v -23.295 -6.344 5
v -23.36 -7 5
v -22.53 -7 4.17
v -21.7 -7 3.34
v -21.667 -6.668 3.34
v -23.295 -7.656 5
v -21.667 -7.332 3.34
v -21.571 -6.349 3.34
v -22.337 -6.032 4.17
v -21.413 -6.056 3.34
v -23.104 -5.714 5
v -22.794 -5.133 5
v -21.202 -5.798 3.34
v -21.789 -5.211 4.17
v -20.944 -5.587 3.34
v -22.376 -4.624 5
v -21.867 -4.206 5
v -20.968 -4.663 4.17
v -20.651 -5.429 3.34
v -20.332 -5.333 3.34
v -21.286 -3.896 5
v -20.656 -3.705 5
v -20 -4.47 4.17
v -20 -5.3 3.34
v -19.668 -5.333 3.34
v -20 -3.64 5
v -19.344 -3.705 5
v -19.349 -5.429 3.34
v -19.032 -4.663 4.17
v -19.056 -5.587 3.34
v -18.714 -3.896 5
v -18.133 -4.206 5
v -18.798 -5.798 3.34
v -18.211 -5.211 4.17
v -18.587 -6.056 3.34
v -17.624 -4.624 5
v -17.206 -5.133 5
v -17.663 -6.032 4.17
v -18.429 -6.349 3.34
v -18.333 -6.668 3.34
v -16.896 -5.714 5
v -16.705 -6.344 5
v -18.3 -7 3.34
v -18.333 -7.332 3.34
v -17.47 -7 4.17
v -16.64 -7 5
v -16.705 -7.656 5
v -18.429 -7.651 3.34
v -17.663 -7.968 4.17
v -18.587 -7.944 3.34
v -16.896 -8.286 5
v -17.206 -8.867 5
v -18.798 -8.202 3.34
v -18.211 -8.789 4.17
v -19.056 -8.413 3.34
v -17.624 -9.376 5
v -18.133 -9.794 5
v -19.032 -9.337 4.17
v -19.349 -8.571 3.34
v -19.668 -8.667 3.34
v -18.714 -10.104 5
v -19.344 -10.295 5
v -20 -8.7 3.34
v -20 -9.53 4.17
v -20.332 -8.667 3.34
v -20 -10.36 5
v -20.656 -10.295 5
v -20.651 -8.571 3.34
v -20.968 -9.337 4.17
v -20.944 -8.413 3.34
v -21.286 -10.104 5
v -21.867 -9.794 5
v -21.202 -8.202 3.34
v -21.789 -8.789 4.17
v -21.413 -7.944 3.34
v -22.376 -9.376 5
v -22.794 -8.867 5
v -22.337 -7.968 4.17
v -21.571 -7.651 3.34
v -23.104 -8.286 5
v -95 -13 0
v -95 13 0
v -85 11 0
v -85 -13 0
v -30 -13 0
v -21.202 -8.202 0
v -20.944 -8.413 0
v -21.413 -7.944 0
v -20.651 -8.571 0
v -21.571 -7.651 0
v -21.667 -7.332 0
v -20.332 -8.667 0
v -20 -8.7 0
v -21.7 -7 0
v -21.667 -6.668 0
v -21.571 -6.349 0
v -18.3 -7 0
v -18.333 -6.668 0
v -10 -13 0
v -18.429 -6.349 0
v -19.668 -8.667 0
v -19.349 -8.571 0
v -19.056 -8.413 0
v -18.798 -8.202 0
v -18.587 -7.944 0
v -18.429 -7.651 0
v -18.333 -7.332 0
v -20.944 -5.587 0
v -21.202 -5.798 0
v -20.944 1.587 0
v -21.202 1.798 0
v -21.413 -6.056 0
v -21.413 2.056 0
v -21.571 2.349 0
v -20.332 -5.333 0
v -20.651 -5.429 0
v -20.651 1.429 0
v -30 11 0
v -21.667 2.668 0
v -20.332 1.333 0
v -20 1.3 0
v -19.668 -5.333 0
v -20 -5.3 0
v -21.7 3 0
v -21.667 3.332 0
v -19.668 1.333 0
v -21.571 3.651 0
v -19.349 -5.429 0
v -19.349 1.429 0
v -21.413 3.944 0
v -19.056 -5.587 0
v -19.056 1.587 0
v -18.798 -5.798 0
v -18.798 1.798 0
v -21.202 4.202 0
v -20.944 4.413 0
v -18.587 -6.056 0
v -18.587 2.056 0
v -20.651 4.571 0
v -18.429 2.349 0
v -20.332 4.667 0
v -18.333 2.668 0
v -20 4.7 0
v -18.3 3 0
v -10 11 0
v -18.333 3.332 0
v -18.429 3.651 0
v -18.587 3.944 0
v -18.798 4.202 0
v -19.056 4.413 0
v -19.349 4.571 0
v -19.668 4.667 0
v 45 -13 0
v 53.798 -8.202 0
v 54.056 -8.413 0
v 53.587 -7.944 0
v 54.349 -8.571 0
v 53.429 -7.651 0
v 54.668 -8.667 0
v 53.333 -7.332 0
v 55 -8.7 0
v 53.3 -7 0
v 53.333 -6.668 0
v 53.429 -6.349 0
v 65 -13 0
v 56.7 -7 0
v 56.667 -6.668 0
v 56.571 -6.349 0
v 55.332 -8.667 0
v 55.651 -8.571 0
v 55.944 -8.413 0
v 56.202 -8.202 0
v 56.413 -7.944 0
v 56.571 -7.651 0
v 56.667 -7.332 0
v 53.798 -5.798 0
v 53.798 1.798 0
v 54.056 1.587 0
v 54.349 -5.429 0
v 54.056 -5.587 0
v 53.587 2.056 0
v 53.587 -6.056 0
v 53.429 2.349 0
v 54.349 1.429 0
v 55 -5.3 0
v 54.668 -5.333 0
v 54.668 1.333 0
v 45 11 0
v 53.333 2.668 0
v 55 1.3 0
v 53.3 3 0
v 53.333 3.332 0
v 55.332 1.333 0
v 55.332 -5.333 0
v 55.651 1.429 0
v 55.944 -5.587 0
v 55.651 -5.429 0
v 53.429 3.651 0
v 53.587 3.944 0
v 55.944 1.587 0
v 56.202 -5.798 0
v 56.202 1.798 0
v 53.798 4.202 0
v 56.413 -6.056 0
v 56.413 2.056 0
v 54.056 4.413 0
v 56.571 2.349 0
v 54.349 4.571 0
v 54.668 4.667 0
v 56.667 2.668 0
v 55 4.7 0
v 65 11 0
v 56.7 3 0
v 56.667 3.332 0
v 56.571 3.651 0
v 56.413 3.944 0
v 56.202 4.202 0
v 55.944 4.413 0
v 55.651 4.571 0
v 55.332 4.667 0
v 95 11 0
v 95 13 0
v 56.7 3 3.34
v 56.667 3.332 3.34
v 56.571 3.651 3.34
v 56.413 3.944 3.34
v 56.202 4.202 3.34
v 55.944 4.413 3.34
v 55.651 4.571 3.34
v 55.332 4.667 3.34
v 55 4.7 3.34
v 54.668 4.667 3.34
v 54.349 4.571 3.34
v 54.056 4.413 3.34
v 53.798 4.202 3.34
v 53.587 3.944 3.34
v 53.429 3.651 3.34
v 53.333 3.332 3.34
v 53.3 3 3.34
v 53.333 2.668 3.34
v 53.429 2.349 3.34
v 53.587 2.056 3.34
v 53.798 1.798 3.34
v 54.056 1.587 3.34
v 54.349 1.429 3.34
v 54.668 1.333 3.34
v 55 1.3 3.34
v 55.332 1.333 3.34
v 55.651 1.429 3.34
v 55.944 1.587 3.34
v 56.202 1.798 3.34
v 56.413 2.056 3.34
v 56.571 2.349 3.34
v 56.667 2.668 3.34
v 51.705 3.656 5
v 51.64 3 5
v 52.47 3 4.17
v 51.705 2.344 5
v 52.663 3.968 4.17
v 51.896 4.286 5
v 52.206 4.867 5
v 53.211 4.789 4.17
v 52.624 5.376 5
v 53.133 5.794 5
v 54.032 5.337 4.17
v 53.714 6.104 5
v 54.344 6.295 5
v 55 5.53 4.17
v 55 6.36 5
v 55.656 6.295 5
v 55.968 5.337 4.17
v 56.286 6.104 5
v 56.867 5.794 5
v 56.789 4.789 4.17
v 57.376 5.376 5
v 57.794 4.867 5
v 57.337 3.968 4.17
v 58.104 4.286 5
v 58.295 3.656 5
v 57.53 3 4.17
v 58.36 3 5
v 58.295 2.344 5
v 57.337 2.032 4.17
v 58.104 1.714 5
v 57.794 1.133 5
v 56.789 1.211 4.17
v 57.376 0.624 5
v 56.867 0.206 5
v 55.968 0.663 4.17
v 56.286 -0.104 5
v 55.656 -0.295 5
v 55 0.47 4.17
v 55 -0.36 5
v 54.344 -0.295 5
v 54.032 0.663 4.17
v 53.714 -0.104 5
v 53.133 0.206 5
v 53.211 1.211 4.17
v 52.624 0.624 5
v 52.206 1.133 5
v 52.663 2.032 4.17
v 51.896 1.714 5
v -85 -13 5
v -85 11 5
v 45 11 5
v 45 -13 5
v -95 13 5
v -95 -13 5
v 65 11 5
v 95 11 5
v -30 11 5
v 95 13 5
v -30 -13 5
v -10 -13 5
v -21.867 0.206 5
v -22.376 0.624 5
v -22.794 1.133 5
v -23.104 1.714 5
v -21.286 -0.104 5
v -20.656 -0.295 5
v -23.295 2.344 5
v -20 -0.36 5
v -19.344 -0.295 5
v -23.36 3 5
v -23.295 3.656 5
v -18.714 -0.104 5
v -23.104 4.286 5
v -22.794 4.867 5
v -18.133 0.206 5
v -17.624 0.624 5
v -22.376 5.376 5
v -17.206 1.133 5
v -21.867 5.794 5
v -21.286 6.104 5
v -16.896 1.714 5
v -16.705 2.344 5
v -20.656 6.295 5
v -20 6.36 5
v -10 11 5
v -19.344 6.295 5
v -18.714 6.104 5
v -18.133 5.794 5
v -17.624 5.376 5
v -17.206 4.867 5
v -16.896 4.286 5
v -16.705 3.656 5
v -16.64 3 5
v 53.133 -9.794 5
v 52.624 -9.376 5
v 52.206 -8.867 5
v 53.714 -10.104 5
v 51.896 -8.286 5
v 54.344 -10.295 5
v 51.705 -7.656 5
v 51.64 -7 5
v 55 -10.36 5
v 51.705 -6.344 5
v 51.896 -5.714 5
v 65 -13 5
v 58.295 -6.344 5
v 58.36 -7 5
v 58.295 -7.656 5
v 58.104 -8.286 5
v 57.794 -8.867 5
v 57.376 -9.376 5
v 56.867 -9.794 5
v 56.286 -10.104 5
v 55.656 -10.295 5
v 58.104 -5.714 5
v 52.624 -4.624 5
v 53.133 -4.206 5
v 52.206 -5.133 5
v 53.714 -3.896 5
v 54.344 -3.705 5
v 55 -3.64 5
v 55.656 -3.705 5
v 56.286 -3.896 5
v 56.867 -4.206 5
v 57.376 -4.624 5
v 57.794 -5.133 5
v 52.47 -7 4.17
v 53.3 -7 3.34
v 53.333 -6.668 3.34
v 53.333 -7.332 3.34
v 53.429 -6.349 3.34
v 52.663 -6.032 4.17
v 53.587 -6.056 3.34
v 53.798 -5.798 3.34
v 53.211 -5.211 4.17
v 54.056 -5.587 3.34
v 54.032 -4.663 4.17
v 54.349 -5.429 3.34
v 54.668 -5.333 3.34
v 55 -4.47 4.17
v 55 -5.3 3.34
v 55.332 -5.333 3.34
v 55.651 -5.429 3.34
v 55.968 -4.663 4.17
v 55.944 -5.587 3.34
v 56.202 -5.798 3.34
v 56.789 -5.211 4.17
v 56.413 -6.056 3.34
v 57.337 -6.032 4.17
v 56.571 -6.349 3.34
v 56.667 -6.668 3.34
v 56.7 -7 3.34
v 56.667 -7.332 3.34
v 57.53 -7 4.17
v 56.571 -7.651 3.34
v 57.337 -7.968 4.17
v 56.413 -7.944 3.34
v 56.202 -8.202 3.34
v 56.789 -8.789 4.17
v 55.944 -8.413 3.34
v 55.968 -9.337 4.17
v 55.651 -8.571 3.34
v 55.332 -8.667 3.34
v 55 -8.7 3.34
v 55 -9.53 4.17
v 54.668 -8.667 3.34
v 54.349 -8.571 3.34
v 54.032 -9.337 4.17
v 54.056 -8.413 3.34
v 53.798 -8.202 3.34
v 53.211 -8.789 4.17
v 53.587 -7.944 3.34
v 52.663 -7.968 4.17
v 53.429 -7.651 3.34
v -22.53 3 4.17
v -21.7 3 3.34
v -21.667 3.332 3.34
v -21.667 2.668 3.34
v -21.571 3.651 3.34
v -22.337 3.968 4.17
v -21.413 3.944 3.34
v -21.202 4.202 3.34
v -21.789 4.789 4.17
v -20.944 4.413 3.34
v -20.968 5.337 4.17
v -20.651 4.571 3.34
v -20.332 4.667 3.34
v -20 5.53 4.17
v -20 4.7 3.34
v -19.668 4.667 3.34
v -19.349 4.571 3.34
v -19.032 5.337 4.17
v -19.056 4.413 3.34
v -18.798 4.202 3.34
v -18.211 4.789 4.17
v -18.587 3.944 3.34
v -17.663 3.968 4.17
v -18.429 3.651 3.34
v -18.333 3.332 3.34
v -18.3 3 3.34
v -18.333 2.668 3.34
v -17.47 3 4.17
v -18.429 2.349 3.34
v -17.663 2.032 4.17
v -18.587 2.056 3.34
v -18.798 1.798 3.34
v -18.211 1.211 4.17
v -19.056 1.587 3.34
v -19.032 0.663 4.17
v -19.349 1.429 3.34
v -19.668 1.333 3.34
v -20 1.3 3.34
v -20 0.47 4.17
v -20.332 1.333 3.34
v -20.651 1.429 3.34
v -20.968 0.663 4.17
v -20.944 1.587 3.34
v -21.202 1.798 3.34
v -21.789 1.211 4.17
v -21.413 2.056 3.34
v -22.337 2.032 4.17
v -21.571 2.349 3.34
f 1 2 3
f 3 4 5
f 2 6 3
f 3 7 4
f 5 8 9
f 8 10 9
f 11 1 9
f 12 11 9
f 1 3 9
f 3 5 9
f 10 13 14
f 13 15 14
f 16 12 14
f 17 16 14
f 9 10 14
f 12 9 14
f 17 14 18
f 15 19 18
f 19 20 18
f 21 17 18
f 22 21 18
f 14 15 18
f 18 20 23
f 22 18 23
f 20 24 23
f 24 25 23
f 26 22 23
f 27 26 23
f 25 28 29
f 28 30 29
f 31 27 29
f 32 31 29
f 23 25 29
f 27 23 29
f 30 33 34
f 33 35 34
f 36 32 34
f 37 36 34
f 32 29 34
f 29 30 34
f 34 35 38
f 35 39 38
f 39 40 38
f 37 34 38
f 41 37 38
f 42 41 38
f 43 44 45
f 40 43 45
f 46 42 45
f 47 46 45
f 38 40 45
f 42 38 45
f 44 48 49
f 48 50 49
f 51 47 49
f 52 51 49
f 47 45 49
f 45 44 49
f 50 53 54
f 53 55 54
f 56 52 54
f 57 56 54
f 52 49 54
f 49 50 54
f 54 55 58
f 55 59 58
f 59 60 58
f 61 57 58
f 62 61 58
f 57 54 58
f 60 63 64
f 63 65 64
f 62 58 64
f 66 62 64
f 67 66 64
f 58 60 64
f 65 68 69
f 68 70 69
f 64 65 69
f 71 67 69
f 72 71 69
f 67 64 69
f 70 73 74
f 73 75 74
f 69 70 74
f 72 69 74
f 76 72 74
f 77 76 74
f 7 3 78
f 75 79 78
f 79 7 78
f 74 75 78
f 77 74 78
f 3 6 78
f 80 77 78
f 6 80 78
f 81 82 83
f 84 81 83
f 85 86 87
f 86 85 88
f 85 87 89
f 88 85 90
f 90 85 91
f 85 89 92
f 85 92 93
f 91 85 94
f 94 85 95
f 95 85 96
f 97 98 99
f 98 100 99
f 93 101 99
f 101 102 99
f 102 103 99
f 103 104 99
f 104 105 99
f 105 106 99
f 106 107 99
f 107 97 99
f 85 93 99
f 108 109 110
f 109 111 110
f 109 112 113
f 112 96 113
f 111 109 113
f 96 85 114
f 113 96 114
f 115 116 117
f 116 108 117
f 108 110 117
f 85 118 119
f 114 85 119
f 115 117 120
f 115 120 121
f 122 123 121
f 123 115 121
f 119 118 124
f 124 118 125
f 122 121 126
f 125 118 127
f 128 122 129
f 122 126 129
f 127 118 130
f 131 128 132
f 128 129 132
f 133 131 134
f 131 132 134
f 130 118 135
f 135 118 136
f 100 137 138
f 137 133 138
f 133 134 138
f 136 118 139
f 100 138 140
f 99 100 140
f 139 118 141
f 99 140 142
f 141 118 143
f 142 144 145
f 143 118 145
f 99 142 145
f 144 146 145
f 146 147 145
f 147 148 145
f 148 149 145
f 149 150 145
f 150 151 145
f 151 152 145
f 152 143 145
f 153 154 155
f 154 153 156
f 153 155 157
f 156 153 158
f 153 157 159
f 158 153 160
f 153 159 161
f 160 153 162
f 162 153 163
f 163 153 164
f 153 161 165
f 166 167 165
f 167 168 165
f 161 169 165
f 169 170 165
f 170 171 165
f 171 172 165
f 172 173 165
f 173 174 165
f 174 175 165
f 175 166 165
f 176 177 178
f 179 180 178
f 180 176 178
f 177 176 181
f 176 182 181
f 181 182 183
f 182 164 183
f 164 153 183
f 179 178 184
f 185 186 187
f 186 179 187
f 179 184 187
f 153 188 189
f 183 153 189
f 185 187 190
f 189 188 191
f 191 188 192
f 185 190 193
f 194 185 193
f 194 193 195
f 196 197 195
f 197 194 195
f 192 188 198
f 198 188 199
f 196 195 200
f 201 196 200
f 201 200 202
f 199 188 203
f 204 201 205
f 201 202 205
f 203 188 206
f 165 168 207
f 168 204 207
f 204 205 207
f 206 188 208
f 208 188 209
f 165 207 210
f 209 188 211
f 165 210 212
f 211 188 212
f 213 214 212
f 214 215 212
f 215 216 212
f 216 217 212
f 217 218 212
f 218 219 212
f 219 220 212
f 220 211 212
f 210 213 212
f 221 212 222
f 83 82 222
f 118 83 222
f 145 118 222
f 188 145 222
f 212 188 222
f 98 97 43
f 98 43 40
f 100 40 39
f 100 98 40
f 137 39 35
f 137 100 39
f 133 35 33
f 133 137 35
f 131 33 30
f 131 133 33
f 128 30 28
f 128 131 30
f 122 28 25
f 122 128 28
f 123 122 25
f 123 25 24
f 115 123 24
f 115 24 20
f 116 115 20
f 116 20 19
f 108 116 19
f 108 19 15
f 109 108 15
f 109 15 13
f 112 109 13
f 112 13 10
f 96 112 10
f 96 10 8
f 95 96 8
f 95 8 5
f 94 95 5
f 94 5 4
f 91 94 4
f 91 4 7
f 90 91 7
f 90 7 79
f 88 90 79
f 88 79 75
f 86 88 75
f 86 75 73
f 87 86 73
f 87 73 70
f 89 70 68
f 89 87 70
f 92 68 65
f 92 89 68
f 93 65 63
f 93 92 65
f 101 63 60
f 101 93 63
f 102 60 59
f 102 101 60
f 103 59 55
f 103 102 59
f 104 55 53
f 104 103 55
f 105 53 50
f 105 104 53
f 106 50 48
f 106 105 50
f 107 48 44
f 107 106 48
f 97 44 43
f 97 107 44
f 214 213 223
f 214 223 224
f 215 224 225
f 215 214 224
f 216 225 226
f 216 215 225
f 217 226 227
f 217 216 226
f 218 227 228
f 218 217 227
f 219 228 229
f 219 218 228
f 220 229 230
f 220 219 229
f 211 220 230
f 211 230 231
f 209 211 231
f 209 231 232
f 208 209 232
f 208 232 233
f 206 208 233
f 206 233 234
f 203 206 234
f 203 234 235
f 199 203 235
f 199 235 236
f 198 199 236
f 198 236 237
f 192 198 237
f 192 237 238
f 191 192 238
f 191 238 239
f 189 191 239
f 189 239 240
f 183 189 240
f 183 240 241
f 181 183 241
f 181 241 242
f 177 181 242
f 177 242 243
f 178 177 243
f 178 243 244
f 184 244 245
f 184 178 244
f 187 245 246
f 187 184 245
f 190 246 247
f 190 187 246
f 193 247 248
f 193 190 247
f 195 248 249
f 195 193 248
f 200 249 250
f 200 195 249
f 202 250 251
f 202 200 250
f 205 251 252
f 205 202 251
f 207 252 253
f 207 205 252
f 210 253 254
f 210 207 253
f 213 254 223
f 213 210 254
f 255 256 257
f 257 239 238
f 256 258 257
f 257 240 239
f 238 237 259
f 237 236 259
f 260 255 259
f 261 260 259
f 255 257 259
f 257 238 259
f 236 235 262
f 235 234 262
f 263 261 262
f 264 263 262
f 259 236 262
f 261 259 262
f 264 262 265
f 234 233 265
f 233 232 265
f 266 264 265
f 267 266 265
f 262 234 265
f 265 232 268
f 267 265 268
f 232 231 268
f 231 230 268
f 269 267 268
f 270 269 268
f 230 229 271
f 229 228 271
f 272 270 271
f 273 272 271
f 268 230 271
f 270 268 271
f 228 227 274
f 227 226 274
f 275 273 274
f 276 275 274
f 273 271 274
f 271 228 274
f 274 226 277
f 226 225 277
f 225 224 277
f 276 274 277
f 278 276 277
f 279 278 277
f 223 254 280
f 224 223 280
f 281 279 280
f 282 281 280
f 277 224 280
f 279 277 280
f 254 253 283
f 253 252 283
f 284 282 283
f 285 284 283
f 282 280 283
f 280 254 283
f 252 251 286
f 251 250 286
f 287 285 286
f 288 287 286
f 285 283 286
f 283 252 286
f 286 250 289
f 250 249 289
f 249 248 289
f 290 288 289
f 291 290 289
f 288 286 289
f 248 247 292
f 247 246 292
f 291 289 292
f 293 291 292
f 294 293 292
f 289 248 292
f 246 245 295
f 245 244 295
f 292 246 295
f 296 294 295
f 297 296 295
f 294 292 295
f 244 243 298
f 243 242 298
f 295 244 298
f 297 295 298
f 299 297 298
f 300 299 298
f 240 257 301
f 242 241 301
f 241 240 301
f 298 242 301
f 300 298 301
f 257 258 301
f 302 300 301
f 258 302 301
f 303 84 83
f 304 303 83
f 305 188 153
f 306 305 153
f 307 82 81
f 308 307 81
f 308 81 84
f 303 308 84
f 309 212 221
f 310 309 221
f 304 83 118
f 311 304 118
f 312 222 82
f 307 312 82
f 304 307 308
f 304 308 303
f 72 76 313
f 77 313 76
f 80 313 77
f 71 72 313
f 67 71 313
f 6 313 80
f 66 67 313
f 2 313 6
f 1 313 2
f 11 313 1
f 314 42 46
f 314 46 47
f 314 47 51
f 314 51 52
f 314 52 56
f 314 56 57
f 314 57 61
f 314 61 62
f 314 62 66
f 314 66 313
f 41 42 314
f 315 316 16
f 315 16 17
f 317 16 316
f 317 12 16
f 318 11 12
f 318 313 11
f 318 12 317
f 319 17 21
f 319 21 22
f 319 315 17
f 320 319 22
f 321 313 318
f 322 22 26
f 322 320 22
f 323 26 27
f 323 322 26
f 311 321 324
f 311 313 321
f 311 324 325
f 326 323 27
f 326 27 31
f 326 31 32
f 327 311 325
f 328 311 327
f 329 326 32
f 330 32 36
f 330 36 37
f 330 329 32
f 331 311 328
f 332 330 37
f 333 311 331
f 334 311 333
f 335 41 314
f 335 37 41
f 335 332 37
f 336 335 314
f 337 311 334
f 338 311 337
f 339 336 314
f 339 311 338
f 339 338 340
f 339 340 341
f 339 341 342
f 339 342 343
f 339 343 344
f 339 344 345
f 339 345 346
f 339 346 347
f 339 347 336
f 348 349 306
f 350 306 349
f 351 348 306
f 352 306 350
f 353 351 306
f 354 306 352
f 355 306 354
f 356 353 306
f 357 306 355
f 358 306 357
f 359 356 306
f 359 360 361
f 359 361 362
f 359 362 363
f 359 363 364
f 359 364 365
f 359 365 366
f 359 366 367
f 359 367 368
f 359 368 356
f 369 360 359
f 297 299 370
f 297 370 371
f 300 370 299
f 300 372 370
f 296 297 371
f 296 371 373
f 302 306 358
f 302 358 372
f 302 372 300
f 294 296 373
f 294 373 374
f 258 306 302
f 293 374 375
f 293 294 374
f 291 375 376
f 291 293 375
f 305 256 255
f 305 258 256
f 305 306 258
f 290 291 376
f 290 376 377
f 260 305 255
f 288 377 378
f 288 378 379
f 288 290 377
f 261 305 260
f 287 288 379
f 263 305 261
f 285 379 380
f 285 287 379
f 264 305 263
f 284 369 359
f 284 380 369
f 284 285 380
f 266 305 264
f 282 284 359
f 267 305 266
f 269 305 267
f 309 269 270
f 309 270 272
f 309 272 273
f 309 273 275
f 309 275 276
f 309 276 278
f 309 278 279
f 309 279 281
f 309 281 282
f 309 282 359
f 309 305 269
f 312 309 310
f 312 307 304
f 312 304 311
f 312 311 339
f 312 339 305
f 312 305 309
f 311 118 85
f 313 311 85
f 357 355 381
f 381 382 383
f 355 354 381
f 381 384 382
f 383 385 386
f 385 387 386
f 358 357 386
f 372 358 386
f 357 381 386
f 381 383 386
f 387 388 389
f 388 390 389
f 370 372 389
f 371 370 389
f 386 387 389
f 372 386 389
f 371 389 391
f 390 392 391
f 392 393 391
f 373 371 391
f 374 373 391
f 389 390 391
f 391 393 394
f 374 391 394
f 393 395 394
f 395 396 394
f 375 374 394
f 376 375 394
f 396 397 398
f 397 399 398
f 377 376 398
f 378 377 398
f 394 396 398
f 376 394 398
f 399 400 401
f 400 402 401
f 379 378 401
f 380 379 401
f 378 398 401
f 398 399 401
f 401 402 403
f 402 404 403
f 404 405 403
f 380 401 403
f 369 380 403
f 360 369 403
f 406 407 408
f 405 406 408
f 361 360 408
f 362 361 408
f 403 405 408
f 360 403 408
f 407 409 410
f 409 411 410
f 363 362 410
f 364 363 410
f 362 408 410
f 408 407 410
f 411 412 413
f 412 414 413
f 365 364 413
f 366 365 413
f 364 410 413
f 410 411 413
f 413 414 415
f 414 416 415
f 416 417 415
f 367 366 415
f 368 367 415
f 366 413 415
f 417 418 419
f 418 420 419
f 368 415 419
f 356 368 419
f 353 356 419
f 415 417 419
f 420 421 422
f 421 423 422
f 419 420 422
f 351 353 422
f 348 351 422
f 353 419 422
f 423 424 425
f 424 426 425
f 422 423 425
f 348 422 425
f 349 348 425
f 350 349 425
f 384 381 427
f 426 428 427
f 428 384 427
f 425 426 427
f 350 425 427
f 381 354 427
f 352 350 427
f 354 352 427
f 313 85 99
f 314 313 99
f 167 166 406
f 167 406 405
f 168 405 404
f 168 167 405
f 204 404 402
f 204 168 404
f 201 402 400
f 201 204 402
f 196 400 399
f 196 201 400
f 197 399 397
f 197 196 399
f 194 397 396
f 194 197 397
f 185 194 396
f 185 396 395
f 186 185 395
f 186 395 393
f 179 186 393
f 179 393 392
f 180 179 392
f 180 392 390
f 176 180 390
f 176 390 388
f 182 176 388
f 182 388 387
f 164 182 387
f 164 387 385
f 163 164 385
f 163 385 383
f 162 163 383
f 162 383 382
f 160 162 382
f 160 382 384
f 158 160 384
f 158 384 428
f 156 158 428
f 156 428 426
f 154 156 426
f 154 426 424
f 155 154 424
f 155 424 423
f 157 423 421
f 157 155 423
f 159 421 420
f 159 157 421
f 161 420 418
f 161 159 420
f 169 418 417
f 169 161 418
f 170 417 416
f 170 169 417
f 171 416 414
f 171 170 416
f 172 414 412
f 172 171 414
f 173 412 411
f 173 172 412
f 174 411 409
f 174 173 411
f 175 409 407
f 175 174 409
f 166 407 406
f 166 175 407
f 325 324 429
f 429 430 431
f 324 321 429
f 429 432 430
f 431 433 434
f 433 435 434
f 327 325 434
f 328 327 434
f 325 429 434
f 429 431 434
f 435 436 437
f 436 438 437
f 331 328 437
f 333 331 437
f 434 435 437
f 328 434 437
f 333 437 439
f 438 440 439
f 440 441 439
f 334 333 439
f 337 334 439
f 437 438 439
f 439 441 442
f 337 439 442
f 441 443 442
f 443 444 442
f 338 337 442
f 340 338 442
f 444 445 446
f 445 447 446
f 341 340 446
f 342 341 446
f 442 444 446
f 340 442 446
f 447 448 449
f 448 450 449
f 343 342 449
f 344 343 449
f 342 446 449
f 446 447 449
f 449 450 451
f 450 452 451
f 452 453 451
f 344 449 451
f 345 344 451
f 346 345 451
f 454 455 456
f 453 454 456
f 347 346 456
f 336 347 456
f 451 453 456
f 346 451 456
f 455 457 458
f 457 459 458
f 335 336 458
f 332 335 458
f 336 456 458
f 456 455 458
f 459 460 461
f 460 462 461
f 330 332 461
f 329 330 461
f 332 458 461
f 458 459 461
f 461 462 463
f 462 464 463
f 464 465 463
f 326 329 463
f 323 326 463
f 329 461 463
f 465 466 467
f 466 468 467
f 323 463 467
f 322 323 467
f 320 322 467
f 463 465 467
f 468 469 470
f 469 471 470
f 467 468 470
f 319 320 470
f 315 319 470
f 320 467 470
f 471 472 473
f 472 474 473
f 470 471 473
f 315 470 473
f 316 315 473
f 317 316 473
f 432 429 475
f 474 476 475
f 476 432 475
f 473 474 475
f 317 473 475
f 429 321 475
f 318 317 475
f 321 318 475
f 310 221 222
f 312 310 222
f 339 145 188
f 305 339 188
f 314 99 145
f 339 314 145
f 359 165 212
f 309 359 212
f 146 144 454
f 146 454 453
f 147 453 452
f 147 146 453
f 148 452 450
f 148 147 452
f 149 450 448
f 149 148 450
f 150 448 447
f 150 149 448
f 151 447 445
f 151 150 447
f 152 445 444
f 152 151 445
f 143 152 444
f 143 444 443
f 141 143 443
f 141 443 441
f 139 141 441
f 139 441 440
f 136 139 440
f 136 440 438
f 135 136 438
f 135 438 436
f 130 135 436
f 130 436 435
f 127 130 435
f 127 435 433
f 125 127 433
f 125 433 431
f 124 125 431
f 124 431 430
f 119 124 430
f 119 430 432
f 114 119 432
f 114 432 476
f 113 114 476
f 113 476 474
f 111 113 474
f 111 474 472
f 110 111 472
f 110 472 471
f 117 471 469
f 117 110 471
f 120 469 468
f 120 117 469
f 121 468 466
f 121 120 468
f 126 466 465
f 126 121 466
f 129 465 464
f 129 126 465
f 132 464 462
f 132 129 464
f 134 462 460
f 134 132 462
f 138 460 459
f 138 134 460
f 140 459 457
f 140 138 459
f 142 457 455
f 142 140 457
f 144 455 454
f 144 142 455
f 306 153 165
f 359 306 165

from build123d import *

# Parameters (mm, degrees)
F0_R           = 1.7
F1_DEPTH       = 5
F3_D           = 3.4
F3_CSINK_D     = 6.72
F3_CSINK_ANGLE = 90


with BuildPart() as f1:
    # F0 (on Top) → F1 (new body)
    with BuildSketch(Plane.XY):
        Polygon((95, 13), (-95, 13), (-95, -13), (-85, -13), (-85, 11), (-30, 11), (-30, 3), (-30, -13), (-10, -13), (-10, 11), (45, 11), (45, 3), (45, -13), (65, -13), (65, 11), (95, 11), align=None)
        with Locations((-20, -7)):
            Circle(F0_R, mode=Mode.SUBTRACT)
        with Locations((55, -7)):
            Circle(F0_R, mode=Mode.SUBTRACT)
        with Locations((-20, 3)):
            Circle(F0_R, mode=Mode.SUBTRACT)
        with Locations((55, 3)):
            Circle(F0_R, mode=Mode.SUBTRACT)
    extrude(amount=F1_DEPTH)

    # F3 (through all)
    with Locations(Plane.XY.offset(5)):
        with Locations((-20, 3), (-20, -7), (55, 3), (55, -7)):
            CounterSinkHole(F3_D / 2, F3_CSINK_D / 2, counter_sink_angle=F3_CSINK_ANGLE)


solid = f1.part
